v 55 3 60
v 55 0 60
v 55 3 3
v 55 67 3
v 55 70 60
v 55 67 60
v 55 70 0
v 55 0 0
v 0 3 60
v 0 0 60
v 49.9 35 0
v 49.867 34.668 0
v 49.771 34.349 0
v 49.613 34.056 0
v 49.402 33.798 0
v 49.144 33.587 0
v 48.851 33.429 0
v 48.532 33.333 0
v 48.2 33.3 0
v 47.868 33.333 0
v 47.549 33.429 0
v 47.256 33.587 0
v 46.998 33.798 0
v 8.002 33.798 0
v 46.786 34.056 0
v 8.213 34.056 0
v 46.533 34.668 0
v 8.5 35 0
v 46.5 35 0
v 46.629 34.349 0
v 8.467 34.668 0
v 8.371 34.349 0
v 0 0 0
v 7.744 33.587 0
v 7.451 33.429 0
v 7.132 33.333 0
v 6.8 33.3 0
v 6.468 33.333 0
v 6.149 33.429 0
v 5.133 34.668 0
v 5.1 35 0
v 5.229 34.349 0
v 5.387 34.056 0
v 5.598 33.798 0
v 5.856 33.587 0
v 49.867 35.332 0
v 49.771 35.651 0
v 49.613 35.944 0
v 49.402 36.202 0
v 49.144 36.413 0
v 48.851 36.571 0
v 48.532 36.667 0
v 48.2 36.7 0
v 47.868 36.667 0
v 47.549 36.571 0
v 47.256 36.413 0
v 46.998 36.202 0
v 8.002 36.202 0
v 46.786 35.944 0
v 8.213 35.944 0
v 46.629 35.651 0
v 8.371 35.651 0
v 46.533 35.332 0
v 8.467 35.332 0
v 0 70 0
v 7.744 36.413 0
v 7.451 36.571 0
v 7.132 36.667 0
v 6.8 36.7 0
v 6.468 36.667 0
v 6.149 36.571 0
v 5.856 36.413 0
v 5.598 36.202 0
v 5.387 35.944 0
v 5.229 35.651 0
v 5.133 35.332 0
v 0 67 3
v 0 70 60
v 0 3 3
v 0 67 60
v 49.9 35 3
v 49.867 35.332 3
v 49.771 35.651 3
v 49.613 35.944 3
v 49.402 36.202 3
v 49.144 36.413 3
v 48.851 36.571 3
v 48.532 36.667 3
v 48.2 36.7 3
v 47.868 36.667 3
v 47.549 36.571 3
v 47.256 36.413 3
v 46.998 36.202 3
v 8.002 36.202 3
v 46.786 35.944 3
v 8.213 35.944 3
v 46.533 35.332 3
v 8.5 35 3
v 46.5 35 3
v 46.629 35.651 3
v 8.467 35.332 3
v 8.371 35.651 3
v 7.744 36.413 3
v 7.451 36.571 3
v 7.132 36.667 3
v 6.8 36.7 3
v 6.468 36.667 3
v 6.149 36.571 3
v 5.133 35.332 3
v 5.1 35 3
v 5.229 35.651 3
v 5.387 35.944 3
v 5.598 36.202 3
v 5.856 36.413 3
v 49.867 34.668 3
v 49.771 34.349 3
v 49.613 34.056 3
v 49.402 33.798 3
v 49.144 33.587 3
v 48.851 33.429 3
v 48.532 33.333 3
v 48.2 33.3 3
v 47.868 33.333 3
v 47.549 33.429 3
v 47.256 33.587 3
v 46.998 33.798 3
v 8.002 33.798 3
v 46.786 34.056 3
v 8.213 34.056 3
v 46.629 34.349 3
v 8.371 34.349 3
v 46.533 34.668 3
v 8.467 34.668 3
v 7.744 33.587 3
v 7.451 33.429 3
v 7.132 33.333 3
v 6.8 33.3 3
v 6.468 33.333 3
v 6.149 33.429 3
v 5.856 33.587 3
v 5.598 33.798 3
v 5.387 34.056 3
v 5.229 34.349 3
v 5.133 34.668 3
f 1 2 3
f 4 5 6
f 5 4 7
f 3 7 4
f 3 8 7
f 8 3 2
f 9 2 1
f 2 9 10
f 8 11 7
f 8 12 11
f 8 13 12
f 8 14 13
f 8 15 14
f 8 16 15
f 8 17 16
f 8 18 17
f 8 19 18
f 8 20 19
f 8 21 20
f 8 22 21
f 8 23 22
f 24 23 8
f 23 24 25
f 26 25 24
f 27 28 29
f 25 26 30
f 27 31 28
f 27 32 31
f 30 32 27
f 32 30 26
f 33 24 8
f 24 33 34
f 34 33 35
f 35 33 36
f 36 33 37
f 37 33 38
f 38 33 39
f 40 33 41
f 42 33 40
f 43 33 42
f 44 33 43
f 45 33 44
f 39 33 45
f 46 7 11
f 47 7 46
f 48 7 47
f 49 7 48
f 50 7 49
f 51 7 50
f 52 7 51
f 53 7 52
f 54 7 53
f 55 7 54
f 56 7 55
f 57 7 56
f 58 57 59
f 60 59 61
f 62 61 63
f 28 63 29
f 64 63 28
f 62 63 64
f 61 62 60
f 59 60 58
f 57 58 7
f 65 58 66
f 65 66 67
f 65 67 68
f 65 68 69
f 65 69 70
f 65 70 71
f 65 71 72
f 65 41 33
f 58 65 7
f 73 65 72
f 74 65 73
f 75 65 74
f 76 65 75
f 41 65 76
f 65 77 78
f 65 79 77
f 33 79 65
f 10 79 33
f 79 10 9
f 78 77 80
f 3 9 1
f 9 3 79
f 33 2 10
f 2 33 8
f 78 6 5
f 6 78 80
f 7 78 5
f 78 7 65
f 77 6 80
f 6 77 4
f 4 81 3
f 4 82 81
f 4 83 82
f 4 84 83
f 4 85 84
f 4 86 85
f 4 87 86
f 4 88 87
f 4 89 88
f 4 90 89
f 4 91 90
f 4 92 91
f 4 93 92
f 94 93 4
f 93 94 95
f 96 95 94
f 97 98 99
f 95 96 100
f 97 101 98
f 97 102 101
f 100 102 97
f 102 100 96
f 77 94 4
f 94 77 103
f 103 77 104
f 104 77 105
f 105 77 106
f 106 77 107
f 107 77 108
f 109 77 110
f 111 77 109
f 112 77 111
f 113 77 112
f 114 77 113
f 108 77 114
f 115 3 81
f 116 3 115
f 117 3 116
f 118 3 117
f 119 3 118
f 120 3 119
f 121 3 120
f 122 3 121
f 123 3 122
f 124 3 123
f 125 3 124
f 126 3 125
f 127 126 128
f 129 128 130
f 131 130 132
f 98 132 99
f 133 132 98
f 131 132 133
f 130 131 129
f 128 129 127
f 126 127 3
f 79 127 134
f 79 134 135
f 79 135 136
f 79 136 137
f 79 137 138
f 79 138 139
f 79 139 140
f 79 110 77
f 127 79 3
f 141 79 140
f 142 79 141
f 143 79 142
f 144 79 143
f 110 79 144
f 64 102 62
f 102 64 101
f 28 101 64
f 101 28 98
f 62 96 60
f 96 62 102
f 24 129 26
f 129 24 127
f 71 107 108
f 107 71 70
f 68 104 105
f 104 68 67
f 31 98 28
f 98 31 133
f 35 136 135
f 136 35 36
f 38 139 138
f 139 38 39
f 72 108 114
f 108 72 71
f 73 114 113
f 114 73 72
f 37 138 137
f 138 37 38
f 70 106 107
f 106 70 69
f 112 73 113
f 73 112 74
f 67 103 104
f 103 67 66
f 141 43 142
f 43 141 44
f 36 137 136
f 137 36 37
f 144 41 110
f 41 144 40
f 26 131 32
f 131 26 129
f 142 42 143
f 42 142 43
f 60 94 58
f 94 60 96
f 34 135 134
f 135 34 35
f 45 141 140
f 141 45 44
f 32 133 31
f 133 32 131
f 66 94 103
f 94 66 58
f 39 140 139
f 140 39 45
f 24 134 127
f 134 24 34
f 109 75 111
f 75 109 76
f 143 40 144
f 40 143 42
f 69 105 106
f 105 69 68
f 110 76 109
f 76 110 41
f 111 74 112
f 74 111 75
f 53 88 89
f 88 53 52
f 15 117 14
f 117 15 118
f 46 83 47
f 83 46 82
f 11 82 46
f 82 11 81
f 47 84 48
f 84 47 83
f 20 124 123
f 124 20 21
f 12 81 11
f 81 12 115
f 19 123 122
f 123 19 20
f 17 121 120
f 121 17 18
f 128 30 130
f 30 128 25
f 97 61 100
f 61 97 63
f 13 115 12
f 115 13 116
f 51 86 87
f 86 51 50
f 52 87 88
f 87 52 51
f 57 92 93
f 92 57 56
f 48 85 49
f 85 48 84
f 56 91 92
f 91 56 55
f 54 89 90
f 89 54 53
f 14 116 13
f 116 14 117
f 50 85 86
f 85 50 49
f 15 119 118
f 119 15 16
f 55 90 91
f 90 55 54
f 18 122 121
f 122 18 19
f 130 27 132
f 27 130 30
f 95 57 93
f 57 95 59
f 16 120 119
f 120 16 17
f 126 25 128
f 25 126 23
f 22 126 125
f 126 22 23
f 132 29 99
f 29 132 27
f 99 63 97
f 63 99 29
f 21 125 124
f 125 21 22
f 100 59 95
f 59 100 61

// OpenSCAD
$fn = 32;

// ----------------------------------------------------------------------
// U-bracket: 55 x 70 x 60 mm
// ----------------------------------------------------------------------

// --- parameters (mm) ---
base_len = 55;            // outer length, X
channel_w = 70;           // outer width, Y
upright_h = 60;           // upright height, Z
mat_t = 3;                // wall thickness
hole_d = 3.4;             // clearance for M3

module hole_z(px, py) {
  translate([px, py, -0.5]) cylinder(h = mat_t + 1, d = hole_d);
}
module hole_y_pz(pz) {
  /* through both uprights along Y */
  translate([0, -0.5, pz]) rotate([-90, 0, 0]) cylinder(h = channel_w + 1, d = hole_d);
}

module base() {
  cube([base_len, channel_w, mat_t]);
}

module uprights() {
  cube([base_len, mat_t, upright_h]);
  translate([0, channel_w - mat_t, 0]) cube([base_len, mat_t, upright_h]);
}

difference() {
  union() {
    base();
    uprights();
  }
  hole_z(6.8, 35);
  hole_z(48.2, 35);
}
